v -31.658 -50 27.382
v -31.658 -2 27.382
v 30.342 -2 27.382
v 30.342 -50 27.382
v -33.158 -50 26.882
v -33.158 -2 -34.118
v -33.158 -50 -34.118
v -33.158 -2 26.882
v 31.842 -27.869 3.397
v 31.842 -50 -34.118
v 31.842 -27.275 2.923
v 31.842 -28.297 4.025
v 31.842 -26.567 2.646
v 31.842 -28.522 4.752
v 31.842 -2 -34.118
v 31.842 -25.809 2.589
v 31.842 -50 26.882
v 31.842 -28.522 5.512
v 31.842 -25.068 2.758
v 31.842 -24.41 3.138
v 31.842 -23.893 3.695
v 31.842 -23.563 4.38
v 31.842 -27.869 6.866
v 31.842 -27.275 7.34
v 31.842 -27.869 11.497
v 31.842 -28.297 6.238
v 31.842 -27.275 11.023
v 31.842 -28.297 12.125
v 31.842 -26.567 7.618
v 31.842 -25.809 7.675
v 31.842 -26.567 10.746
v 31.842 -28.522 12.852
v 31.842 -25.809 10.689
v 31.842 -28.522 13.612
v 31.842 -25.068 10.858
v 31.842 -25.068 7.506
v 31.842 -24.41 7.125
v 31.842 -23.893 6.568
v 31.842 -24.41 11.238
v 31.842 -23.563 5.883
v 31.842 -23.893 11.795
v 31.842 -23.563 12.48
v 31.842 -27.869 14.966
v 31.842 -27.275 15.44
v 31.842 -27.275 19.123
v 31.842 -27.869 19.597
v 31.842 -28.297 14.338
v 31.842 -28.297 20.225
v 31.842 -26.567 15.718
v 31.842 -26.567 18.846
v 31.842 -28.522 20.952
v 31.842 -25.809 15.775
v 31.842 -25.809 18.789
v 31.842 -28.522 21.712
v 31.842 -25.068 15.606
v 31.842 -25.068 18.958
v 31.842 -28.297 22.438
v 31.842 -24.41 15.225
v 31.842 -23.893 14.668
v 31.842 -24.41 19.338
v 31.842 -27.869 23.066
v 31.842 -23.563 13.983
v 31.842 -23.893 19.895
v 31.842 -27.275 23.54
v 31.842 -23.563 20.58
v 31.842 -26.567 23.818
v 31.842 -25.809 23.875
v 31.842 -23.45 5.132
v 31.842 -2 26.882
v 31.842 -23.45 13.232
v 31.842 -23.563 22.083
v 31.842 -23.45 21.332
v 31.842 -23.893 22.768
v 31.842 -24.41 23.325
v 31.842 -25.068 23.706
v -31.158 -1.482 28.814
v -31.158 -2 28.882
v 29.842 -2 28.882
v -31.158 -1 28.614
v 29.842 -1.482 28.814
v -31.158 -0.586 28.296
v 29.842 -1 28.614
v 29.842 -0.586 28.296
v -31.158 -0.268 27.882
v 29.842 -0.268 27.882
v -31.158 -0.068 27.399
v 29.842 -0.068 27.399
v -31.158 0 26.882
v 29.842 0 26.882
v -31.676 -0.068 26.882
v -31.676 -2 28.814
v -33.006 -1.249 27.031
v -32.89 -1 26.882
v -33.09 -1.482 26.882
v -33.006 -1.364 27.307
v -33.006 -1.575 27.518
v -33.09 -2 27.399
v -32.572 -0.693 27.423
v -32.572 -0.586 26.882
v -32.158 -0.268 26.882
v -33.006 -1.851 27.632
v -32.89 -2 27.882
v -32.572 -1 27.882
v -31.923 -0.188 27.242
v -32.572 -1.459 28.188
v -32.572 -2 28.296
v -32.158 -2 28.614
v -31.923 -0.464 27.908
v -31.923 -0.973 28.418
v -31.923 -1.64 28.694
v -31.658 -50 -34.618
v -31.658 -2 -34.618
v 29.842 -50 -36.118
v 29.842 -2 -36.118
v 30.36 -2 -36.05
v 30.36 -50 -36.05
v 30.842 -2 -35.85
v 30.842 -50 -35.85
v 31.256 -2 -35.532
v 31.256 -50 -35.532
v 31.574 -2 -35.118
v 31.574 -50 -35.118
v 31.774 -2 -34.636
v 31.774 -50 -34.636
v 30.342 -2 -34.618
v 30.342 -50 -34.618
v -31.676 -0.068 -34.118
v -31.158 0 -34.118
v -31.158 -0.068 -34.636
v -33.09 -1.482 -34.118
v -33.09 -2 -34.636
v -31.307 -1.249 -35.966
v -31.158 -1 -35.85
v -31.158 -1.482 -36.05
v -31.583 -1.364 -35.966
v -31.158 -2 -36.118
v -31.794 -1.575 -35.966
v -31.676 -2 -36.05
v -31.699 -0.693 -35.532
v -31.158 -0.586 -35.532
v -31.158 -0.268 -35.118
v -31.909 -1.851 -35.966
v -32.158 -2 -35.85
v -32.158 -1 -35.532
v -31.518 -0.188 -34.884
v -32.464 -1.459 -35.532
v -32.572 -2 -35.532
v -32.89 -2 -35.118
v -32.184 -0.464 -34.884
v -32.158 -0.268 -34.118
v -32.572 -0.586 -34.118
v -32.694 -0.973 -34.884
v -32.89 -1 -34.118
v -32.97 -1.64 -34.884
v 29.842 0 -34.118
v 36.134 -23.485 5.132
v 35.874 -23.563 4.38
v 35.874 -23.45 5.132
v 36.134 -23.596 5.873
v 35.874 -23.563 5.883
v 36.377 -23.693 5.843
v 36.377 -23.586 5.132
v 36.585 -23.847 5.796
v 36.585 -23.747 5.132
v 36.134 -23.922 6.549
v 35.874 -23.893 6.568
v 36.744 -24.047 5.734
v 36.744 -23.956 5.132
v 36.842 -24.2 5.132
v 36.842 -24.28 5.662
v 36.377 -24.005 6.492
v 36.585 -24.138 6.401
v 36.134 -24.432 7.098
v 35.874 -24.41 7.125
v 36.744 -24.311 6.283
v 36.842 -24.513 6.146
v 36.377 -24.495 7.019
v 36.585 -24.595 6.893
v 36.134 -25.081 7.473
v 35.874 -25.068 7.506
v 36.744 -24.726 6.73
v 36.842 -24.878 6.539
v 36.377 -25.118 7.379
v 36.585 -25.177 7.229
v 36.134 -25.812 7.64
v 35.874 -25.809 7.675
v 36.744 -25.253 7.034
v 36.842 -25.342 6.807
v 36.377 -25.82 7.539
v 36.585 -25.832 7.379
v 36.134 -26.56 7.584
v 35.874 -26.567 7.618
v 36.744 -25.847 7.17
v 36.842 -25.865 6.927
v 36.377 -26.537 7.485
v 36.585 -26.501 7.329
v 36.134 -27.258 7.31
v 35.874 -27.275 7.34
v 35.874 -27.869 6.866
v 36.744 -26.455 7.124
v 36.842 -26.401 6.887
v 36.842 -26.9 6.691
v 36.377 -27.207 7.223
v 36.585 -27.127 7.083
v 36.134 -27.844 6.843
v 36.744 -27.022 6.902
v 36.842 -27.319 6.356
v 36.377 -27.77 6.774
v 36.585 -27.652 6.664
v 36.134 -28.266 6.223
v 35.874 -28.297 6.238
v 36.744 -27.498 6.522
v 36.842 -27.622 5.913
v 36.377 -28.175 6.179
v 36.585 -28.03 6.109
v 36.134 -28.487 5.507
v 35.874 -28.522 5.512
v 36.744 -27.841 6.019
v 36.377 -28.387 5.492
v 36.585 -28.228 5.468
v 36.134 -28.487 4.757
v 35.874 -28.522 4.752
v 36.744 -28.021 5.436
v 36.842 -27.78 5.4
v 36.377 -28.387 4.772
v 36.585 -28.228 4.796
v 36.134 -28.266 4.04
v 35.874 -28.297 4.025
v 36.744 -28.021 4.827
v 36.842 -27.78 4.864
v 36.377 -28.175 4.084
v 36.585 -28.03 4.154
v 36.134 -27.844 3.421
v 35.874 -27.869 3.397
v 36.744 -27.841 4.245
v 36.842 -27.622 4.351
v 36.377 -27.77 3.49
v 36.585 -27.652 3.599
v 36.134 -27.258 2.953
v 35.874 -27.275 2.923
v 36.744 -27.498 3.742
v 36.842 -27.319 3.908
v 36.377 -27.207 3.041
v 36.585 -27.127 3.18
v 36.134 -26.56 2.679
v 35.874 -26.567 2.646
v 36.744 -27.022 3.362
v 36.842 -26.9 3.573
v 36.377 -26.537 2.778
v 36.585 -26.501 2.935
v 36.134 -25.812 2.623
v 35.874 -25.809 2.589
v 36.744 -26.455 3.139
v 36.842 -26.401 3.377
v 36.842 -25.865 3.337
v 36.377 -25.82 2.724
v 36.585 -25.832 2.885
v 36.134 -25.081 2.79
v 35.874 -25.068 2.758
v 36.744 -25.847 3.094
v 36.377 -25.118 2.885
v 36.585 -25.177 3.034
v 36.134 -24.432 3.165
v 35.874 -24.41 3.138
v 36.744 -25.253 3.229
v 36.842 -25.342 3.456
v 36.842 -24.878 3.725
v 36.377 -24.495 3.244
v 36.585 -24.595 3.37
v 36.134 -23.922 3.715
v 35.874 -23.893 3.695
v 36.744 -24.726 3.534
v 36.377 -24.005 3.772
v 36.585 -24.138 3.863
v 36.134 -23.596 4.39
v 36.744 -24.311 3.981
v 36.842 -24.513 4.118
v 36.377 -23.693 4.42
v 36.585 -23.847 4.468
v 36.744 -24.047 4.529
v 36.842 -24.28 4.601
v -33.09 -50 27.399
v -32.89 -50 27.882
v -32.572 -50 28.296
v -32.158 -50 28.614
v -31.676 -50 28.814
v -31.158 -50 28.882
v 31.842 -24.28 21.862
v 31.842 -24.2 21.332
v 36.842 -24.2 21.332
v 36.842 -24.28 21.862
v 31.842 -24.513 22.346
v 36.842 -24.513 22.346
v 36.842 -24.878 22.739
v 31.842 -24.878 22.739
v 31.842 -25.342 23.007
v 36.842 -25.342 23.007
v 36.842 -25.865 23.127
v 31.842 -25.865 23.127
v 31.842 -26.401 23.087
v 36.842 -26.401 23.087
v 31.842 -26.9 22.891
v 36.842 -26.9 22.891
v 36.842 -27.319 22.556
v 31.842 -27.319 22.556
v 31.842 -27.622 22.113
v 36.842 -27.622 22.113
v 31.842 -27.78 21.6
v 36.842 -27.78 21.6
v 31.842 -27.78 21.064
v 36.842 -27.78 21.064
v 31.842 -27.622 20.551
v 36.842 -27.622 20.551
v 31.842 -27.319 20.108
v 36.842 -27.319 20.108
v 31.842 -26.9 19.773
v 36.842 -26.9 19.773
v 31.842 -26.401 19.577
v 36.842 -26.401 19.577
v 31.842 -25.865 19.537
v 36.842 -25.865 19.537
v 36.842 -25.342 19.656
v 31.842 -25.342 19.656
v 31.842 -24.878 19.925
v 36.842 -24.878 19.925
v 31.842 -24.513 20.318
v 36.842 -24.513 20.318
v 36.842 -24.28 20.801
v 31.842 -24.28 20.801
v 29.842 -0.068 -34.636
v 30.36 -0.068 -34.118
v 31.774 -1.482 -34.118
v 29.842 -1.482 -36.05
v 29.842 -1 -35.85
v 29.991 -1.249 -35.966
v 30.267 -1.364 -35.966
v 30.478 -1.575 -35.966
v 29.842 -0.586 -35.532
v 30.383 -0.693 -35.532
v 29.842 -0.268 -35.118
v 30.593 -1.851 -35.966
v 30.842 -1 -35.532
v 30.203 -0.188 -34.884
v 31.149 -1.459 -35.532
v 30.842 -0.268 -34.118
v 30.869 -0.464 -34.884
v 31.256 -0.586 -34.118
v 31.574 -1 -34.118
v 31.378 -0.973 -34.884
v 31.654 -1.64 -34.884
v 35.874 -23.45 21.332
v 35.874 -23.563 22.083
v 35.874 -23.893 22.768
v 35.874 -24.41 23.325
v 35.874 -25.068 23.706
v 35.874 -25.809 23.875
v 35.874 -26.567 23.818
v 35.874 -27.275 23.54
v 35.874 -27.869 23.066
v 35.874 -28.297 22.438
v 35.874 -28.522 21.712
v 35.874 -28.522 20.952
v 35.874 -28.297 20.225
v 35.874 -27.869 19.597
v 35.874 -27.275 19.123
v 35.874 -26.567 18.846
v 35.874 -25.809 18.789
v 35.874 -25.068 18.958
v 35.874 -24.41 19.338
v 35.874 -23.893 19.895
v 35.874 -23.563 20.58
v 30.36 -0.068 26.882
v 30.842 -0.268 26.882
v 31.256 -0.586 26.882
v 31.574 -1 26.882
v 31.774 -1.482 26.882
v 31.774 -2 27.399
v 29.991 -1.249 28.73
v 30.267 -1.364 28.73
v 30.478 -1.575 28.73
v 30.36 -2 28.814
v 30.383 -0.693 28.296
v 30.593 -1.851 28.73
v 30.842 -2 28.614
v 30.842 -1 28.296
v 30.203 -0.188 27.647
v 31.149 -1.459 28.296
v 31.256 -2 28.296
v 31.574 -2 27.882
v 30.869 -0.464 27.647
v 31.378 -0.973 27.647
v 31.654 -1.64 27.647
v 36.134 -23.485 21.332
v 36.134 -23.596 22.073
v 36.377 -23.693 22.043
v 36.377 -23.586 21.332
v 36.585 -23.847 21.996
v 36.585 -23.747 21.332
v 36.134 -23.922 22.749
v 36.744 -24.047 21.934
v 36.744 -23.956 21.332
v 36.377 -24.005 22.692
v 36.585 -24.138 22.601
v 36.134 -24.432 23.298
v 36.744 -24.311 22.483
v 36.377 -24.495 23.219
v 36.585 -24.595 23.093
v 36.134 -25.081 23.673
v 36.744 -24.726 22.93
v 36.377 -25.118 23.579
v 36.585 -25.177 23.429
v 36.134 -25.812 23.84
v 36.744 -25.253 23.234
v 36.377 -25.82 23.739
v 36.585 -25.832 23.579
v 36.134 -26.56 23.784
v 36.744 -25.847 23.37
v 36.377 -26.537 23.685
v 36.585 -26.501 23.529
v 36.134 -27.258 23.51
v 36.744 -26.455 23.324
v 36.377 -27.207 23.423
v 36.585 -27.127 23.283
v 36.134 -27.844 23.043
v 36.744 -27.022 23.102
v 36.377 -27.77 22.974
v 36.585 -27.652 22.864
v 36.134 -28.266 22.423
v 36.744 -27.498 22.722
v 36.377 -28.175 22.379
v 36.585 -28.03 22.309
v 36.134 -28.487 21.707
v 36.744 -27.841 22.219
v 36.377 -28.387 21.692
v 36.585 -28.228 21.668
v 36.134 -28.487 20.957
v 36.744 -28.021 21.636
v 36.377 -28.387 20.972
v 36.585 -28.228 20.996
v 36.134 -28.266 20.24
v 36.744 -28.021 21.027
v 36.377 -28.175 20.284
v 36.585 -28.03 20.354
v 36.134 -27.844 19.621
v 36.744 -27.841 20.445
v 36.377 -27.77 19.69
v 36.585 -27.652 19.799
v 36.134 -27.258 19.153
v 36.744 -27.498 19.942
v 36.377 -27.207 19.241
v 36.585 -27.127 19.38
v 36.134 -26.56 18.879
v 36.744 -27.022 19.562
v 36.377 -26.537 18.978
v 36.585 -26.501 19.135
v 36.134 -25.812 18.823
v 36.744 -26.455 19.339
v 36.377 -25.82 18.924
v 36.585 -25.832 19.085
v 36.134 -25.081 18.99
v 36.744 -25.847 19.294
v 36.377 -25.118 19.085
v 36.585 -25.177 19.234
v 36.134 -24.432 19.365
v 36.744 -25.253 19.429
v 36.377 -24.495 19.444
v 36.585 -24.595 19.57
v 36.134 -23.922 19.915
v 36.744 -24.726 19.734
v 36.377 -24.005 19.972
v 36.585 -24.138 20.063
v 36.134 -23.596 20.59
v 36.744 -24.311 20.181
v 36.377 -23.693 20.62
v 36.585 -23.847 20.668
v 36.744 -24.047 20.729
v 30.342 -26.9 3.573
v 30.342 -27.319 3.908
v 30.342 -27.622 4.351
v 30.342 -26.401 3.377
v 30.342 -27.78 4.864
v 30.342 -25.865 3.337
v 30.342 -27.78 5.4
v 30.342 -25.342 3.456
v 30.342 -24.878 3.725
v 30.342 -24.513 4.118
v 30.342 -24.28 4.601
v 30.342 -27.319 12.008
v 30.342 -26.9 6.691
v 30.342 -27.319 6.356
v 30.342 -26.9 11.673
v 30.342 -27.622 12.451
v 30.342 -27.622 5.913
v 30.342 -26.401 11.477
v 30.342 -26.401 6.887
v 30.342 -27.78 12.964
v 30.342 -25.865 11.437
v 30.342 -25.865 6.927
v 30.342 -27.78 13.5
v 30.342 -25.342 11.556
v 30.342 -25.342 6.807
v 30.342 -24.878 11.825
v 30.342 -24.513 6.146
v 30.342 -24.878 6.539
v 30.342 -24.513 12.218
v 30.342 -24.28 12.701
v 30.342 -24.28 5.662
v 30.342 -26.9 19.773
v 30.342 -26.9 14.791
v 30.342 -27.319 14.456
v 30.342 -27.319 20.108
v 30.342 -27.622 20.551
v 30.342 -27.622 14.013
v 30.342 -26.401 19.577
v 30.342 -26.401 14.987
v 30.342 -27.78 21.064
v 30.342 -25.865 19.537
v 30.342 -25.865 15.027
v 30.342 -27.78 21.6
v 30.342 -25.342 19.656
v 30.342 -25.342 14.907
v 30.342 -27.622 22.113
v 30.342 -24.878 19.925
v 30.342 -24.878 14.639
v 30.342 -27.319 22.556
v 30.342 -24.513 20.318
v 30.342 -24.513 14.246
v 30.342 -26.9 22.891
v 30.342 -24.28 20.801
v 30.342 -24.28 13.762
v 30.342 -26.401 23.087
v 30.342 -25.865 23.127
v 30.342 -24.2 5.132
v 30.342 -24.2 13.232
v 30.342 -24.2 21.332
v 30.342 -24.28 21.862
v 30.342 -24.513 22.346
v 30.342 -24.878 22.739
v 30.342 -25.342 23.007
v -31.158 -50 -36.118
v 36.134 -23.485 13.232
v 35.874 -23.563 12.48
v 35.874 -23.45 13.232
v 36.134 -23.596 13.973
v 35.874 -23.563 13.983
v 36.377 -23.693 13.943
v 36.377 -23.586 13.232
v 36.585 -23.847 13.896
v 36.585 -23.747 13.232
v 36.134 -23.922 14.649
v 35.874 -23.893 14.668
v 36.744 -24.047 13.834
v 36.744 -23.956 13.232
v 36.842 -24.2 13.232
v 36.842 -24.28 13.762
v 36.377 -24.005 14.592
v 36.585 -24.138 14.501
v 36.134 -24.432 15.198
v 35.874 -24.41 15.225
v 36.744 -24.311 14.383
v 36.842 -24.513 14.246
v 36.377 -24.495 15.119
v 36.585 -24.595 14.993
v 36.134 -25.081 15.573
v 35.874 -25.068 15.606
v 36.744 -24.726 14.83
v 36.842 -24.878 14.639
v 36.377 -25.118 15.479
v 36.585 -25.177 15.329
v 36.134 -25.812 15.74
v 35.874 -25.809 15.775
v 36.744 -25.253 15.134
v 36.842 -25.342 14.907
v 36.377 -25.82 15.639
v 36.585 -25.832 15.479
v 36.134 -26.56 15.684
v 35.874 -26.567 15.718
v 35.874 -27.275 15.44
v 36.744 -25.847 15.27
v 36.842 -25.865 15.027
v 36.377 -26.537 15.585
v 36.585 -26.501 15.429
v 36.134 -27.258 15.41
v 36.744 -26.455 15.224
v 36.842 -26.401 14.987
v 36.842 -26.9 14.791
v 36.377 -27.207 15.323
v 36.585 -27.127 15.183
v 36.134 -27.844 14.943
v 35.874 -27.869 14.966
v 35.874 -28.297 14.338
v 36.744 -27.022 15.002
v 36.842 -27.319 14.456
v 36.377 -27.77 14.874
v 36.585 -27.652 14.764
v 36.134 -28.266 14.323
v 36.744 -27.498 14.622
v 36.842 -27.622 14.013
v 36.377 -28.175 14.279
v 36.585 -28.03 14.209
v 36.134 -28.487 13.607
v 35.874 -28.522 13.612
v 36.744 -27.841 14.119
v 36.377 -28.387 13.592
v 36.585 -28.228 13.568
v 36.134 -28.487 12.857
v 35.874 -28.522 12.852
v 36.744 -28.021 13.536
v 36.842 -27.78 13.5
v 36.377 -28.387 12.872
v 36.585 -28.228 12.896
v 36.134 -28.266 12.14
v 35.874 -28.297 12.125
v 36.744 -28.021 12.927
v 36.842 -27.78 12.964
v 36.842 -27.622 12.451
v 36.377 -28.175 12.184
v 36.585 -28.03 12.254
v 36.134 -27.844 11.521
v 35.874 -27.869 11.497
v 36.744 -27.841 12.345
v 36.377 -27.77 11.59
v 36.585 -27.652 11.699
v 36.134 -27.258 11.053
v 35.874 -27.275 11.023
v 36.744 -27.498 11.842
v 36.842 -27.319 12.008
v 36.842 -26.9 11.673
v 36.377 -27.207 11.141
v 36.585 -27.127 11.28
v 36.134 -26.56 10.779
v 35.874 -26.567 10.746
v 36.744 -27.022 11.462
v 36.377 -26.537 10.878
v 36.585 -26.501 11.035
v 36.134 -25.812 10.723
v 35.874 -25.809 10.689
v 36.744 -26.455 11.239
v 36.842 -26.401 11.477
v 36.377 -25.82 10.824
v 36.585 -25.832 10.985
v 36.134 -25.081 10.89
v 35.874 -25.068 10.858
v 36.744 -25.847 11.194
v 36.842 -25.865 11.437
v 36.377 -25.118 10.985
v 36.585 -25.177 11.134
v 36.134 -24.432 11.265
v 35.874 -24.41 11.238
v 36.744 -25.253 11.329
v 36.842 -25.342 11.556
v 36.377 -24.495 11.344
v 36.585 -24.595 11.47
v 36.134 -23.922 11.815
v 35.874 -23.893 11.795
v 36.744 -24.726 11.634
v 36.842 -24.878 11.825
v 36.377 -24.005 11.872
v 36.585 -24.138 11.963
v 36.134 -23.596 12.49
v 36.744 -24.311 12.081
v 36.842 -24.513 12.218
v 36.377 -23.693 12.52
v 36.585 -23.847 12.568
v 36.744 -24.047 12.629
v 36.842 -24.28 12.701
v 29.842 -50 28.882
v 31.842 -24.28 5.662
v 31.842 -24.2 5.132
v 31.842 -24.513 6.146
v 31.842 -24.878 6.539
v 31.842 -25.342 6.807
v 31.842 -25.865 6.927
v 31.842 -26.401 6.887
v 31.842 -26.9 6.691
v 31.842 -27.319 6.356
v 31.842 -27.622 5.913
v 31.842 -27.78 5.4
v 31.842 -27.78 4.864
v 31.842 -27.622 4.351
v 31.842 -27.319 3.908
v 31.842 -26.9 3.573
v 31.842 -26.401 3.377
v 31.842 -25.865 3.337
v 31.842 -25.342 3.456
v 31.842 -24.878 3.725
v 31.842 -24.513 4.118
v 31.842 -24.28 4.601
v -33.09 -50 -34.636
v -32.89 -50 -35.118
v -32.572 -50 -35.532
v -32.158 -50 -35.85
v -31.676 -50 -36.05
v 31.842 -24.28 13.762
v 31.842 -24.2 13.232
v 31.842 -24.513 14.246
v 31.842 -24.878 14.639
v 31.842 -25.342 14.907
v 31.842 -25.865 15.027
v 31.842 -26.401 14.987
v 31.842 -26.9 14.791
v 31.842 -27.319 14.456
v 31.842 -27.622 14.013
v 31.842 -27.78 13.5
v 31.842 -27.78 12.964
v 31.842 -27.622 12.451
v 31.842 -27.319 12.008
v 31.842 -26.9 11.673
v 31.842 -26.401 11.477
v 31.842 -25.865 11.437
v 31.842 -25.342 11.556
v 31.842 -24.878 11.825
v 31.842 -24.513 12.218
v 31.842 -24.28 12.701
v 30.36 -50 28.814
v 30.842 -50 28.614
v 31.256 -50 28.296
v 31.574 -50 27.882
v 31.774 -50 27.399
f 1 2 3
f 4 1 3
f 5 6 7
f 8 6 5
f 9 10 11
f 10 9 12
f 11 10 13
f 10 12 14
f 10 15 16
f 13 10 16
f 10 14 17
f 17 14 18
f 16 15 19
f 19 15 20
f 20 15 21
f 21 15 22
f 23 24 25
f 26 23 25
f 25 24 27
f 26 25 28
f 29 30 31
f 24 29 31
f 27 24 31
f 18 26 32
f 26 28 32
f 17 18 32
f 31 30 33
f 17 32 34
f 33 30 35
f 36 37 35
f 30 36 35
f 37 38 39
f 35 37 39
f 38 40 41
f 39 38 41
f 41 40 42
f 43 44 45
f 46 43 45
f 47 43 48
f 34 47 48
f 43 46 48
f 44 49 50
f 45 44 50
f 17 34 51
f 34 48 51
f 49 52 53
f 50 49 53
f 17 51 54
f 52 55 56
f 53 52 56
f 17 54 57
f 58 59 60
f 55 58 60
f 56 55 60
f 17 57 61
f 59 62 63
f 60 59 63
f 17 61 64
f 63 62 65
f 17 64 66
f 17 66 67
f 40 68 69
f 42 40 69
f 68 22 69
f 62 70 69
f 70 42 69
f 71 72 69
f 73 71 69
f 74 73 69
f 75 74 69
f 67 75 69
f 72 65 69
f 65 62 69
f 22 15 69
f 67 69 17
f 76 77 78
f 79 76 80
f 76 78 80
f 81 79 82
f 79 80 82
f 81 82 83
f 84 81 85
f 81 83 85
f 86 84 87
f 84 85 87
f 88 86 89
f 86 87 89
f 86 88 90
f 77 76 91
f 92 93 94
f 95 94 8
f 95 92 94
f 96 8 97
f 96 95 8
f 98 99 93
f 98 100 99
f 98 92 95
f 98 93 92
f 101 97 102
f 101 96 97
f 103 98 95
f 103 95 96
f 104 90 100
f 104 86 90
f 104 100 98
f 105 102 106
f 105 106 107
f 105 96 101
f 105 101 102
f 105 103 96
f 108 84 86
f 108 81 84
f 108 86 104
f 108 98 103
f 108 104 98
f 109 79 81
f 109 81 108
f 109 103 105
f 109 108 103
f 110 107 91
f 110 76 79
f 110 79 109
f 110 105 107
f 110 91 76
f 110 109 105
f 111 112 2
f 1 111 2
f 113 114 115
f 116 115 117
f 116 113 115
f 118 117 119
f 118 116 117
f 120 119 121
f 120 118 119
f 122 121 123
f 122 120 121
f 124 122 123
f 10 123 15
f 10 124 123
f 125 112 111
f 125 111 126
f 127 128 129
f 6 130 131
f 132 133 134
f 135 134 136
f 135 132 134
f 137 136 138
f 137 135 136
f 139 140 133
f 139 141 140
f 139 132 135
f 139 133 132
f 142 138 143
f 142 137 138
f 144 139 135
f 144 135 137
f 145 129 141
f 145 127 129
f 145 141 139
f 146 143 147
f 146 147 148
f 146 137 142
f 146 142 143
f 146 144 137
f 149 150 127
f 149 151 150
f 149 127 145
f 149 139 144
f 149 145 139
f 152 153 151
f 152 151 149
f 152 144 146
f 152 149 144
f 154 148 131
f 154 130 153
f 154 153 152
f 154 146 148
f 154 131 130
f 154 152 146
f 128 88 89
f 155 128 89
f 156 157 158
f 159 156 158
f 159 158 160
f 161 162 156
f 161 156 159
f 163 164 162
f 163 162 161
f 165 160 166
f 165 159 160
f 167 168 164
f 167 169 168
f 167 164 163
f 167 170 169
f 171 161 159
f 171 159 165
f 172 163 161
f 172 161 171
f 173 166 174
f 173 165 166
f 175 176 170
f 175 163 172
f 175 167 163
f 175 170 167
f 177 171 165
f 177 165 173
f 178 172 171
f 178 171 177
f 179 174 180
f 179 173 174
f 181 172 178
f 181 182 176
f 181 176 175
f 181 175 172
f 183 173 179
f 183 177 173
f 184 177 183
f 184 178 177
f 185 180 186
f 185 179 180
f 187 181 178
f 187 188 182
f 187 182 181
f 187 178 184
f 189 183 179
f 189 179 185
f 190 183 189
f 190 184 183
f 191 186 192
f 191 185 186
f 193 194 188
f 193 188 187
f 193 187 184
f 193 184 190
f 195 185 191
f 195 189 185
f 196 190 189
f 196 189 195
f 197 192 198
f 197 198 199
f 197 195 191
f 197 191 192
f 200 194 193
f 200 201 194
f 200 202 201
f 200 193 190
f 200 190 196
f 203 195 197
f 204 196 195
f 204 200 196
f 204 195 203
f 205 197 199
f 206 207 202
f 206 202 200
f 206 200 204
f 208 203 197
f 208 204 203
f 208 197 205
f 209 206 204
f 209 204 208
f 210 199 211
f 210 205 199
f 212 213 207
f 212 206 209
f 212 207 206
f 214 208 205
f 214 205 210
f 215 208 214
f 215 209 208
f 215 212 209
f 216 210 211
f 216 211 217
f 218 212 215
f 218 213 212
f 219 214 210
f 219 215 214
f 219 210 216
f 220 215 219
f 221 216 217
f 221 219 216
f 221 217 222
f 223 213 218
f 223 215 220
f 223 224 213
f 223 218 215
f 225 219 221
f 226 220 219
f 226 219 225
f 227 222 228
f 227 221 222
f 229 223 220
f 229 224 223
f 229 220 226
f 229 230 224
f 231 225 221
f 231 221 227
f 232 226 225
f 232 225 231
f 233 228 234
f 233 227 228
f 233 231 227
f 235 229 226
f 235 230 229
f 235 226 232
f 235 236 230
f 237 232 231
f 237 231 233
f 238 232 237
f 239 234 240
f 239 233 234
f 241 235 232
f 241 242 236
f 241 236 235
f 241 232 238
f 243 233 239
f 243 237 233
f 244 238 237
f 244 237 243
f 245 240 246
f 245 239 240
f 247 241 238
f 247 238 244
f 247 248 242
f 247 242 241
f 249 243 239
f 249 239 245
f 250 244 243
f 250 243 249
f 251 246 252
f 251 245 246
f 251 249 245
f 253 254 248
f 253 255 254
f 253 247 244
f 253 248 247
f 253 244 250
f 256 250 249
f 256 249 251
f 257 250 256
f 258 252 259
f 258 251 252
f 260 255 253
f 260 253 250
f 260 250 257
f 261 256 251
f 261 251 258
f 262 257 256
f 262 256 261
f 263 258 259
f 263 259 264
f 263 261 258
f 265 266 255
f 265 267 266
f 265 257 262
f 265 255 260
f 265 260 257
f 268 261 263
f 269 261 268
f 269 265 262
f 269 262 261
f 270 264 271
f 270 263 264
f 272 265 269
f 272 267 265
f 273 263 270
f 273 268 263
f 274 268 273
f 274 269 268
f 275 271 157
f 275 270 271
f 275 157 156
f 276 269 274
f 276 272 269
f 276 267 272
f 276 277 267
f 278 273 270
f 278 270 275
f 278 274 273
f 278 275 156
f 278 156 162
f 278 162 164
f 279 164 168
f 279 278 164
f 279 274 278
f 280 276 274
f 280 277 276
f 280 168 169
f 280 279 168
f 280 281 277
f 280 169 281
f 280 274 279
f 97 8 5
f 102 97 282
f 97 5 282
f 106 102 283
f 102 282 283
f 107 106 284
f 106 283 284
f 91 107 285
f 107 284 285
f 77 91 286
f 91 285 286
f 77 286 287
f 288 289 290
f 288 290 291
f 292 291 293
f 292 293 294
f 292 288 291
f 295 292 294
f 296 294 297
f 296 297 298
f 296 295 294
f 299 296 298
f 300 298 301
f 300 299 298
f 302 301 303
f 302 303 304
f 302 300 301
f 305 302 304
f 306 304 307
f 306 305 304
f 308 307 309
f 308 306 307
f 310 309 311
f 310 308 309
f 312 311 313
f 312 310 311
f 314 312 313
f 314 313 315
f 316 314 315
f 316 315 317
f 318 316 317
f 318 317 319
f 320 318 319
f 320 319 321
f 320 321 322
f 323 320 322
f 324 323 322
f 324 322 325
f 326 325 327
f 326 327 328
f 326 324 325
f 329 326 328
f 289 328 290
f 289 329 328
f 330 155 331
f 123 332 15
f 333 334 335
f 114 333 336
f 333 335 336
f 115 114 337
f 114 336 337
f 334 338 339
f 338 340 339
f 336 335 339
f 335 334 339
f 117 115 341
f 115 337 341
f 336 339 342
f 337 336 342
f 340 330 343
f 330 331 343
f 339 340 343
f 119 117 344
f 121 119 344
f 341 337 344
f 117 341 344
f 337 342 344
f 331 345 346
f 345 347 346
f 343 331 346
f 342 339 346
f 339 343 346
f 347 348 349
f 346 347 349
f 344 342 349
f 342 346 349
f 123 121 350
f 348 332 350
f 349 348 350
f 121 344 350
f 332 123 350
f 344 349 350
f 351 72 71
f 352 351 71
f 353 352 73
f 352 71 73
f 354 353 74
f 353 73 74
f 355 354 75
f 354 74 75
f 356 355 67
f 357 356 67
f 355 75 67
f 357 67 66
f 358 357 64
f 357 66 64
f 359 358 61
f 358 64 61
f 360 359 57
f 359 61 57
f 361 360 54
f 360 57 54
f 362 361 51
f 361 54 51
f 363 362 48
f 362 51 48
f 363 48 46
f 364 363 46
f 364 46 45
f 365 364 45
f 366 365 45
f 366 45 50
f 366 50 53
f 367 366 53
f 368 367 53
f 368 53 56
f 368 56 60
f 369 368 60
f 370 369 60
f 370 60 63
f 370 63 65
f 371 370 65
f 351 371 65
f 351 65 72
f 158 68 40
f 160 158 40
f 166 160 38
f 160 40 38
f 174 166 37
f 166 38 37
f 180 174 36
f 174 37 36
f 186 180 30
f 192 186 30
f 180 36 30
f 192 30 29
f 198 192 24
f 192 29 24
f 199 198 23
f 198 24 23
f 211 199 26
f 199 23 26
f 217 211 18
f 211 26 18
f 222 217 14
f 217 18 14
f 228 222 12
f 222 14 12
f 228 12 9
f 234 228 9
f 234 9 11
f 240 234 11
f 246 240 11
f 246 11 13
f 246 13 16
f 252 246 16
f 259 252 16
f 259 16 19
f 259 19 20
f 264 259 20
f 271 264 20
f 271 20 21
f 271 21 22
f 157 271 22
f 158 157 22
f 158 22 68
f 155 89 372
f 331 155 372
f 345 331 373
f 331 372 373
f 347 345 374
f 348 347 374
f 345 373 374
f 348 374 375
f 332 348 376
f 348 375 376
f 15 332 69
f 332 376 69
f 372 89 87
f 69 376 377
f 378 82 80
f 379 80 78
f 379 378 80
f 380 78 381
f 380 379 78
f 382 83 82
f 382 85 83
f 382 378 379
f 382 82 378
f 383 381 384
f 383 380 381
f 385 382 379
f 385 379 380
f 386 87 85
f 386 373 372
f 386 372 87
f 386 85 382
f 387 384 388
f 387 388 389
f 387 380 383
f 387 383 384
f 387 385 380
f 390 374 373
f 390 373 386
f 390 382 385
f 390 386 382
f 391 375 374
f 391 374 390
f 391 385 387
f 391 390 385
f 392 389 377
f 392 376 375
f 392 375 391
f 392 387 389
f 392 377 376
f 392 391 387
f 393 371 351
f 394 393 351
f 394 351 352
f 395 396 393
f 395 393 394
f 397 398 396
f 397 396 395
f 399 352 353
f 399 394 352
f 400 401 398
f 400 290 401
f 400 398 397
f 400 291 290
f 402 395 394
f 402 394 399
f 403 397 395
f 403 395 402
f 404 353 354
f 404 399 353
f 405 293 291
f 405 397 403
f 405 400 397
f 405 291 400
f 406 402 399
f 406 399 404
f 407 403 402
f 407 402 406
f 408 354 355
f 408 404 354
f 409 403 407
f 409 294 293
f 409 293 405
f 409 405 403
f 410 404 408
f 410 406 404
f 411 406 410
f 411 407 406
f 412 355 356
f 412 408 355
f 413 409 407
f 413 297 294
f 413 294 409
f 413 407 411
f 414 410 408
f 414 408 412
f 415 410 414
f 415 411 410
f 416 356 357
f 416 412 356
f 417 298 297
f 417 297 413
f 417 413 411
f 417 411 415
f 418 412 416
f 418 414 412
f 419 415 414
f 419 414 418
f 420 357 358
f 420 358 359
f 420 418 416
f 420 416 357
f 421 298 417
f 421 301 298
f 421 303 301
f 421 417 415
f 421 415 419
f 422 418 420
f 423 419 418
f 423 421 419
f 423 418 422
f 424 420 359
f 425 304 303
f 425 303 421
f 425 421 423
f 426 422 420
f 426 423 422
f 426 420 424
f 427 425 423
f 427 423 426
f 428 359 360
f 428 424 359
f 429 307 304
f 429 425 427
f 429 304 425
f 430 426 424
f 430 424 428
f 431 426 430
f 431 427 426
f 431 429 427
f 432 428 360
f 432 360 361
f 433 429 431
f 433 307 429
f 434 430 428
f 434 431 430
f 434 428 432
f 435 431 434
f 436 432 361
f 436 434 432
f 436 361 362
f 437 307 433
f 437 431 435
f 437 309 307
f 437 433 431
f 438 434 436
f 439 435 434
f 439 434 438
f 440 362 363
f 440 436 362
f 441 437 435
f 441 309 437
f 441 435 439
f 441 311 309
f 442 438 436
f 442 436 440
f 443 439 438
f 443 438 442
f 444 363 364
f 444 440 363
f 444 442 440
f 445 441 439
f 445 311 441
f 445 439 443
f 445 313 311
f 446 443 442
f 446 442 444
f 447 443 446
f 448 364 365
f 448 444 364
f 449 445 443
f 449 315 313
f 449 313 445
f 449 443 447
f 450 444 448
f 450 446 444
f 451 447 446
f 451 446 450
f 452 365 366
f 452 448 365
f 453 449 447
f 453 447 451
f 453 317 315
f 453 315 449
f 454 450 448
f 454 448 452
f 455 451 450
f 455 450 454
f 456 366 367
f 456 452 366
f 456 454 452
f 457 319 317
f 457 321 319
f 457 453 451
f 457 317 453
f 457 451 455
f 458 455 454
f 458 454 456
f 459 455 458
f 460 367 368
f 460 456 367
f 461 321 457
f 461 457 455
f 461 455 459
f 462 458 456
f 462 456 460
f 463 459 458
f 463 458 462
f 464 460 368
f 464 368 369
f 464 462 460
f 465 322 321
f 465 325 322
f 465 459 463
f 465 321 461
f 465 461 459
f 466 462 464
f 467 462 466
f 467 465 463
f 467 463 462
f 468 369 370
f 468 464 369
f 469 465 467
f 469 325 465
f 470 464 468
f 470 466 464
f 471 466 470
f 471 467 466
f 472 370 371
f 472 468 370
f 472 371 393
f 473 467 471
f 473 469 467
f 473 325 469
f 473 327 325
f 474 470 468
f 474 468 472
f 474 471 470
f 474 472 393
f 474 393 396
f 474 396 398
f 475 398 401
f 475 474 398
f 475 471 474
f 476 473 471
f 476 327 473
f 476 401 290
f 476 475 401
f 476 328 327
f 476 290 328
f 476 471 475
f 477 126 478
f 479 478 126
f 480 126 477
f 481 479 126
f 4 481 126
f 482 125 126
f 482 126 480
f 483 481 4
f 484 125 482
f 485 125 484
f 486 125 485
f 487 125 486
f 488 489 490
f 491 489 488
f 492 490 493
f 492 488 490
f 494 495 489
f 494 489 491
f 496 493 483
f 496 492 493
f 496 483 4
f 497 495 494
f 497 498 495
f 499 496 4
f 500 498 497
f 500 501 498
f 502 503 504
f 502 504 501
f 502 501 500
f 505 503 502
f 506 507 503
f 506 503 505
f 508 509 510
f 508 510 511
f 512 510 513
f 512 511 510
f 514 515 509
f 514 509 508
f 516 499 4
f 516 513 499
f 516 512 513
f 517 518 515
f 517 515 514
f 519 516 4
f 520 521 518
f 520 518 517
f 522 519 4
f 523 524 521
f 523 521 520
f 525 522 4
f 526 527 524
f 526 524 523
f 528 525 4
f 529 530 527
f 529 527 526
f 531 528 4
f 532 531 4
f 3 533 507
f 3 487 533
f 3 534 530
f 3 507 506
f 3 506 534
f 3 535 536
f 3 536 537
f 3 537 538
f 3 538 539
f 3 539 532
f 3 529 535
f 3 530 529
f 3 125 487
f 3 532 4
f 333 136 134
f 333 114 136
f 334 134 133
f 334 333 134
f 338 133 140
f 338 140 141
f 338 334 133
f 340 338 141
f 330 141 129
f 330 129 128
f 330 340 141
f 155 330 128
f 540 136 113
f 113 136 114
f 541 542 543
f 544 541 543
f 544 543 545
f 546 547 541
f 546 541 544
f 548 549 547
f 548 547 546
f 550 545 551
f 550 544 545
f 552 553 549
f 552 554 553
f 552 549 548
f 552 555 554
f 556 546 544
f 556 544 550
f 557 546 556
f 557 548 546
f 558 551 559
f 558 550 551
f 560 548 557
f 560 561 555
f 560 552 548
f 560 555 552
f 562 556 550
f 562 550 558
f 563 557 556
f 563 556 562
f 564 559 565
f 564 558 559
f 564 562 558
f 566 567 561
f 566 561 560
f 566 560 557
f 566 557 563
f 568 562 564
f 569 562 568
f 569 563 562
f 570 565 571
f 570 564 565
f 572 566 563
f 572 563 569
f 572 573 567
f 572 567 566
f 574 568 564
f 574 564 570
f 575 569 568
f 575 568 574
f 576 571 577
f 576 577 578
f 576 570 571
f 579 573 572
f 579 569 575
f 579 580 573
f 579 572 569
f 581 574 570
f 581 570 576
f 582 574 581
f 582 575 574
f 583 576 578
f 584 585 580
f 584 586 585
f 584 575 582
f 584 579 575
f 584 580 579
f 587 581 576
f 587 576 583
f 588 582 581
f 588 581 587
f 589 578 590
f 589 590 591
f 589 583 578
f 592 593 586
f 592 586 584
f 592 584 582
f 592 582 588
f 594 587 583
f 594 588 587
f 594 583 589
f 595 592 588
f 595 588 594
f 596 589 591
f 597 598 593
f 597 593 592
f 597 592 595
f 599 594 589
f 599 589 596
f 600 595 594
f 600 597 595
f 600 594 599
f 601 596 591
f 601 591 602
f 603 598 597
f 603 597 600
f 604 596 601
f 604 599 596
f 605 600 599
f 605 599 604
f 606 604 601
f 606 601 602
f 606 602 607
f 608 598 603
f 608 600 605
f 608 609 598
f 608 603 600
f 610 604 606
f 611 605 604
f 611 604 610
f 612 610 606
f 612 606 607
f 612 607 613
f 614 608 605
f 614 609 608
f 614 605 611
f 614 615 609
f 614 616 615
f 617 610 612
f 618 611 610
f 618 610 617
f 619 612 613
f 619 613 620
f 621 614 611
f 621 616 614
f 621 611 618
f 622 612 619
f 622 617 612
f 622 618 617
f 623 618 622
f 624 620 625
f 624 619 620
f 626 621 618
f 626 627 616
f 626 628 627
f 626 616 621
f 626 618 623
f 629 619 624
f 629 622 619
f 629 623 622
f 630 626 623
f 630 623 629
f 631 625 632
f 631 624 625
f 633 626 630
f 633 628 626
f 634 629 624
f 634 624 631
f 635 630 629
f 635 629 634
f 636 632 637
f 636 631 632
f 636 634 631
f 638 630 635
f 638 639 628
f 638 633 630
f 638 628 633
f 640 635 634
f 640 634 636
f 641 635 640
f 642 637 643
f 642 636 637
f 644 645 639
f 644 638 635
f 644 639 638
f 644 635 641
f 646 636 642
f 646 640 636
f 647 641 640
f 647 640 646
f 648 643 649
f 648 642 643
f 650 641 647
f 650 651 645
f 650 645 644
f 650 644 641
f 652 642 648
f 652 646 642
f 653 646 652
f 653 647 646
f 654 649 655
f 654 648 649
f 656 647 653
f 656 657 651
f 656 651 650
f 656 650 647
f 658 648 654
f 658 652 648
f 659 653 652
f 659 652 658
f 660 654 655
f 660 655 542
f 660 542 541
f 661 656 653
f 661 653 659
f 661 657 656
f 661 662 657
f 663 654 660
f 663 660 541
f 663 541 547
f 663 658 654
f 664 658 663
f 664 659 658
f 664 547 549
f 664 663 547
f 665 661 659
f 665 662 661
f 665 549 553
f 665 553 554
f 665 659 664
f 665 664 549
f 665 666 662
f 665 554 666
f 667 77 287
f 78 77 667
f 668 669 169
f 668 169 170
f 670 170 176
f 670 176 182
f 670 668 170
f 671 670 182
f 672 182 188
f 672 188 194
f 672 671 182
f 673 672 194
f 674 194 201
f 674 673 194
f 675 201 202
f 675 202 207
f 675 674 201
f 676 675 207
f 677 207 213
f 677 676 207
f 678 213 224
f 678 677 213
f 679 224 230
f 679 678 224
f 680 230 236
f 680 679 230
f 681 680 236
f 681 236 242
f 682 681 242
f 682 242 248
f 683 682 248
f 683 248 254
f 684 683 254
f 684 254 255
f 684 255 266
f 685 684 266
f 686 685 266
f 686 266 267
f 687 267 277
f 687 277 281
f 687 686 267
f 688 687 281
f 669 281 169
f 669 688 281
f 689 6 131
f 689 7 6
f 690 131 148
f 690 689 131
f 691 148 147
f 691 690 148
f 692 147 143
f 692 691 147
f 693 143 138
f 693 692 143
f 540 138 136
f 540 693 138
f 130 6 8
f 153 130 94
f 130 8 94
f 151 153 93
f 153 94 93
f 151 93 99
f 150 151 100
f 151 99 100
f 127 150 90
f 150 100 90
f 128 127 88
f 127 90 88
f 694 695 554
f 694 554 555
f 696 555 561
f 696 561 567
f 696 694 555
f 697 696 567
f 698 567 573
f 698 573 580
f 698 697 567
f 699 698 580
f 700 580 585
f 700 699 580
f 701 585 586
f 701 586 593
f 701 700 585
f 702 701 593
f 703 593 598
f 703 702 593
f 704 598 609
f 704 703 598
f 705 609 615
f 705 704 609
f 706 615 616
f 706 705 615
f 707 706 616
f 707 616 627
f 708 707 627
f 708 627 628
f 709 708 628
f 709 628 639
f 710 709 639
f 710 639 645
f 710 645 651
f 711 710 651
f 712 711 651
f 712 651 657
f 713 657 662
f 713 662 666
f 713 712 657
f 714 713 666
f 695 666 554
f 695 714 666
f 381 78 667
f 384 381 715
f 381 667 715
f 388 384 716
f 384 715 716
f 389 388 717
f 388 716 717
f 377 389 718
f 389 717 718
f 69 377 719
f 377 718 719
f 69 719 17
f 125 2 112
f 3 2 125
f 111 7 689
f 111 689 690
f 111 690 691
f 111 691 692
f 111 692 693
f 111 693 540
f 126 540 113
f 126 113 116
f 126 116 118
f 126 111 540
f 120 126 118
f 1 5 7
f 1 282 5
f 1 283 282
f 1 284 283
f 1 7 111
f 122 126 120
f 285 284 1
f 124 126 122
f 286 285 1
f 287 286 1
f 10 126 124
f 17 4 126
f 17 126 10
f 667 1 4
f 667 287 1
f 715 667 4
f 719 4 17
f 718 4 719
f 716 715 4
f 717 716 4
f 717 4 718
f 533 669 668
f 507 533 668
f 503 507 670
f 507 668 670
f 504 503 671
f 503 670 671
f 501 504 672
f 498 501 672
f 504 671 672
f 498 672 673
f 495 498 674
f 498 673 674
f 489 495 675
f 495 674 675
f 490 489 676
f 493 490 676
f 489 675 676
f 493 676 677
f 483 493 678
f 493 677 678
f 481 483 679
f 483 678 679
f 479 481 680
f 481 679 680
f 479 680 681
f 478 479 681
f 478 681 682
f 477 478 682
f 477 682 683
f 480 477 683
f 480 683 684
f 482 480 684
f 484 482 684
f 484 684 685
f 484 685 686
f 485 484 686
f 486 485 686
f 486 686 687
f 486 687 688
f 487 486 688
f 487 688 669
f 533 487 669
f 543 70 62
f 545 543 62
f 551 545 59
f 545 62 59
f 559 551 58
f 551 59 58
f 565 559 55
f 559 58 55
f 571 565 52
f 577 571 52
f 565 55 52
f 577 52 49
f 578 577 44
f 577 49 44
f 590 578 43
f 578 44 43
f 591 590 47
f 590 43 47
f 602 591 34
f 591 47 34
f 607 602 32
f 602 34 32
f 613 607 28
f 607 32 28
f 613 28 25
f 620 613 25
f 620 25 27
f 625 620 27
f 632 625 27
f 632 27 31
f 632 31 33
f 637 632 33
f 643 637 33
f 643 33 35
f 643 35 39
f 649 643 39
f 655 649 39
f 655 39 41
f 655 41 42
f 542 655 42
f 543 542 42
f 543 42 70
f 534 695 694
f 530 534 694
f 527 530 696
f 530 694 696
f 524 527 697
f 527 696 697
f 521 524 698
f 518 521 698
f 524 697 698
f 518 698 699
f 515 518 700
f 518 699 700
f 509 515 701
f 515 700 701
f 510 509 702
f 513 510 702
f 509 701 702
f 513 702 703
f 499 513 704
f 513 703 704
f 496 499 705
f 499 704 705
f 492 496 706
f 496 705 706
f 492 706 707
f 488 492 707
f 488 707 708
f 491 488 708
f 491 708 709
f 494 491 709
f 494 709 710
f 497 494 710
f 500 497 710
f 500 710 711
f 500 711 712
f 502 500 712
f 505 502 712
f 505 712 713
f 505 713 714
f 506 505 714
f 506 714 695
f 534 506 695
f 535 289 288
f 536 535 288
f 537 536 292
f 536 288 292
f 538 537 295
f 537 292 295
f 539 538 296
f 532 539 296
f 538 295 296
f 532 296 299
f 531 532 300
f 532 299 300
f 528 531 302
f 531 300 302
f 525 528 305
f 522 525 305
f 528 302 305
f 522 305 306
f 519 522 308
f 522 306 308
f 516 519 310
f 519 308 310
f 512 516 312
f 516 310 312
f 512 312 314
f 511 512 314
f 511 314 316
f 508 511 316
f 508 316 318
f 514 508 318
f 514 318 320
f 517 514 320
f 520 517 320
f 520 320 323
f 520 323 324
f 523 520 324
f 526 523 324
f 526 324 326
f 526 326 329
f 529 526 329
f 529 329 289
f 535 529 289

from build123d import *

# Parameters (mm, degrees)
F0_W     = 62
F0_H     = 62
F1_DEPTH = 2
F0_W_2   = 65
F0_H_2   = 65
F2_DEPTH = 50
F3_R     = 2
F4_R     = 1.8
F5_DEPTH = 25
F6_DEPTH = 25
F4_R_2   = 2.55
F7_DEPTH = 5


# Not quite as in the source:
# - a fillet or chamfer that OpenCascade refuses, or shapes differently, is made with other operations: its cross-section is extruded or revolved along the edge and cut away or added


with BuildPart() as f1:
    # F0 (on Front) → F1 (new body)
    with BuildSketch(Plane.XZ):
        with Locations((-0.6578962505, -3.6181825721)):
            Rectangle(F0_W, F0_H)
    extrude(amount=F1_DEPTH)

    # F0 (on Front) → F2 (join)
    with BuildSketch(Plane.XZ):
        with Locations((-0.6578962505, -3.6181825721)):
            Rectangle(F0_W_2, F0_H_2)
        with Locations((-0.6578962505, -3.6181825721)):
            Rectangle(F0_W, F0_H, mode=Mode.SUBTRACT)
    extrude(amount=F2_DEPTH)

    # F3
    f3_edges = [f1.edges().sort_by_distance(p)[0] for p in [
        (31.842104, 0, -3.618183),
        (-0.657896, 0, 28.881817),
        (-33.157896, 0, -3.618183),
        (-0.657896, 0, -36.118183),
        (31.842104, -25, 28.881817),
        (31.842104, -25, -36.118183),
        (-33.157896, -25, -36.118183),
        (-33.157896, -25, 28.881817),
    ]]
    fillet(f3_edges, radius=F3_R)

    # F4 (on face) → F5 (cut)
    with BuildSketch(Plane.YZ.offset(31.8421037495)):
        with Locations((-26, 21.3318174279)):
            Circle(F4_R)
    extrude(amount=-F5_DEPTH, mode=Mode.SUBTRACT)

    # F4 (on face) → F6 (cut)
    with BuildSketch(Plane.YZ.offset(31.8421037495)):
        with Locations((-26, 13.2318174279)):
            Circle(F4_R)
        with Locations((-26, 5.1318174279)):
            Circle(F4_R)
    extrude(amount=-F6_DEPTH, mode=Mode.SUBTRACT)

    # F4 (on face) → F7 (join)
    with BuildSketch(Plane.YZ.offset(31.8421037495)):
        with Locations((-26, 21.3318174279)):
            Circle(F4_R_2)
        with Locations((-26, 21.3318174279)):
            Circle(F4_R, mode=Mode.SUBTRACT)
        with Locations((-26, 13.2318174279)):
            Circle(F4_R_2)
        with Locations((-26, 13.2318174279)):
            Circle(F4_R, mode=Mode.SUBTRACT)
        with Locations((-26, 5.1318174279)):
            Circle(F4_R_2)
        with Locations((-26, 5.1318174279)):
            Circle(F4_R, mode=Mode.SUBTRACT)
    extrude(amount=F7_DEPTH)

    # F8: fillet of radius 1 on 3 edges, made by hand

    # F8_s1 → F8_t2 (revolve, cut)
    with BuildSketch(Plane.XY.offset(21.3318174279)):
        with BuildLine():
            ThreePointArc((35.873857913, -23.45), (36.4862303487, -23.659430585), (36.8421037495, -24.2))
            Line((36.8421037495, -24.2), (36.8421037495, -23.45))
            Line((36.8421037495, -23.45), (35.873857913, -23.45))
        make_face()
    revolve(axis=Axis((36.8421037495, -26, 21.3318174279), (1, 0, 0)), mode=Mode.SUBTRACT)

    # F8_s3 → F8_t4 (revolve, cut)
    with BuildSketch(Plane.XY.offset(13.2318174279)):
        with BuildLine():
            ThreePointArc((35.873857913, -23.45), (36.4862303487, -23.659430585), (36.8421037495, -24.2))
            Line((36.8421037495, -24.2), (36.8421037495, -23.45))
            Line((36.8421037495, -23.45), (35.873857913, -23.45))
        make_face()
    revolve(axis=Axis((36.8421037495, -26, 13.2318174279), (1, 0, 0)), mode=Mode.SUBTRACT)

    # F8_s5 → F8_t6 (revolve, cut)
    with BuildSketch(Plane.XY.offset(5.1318174279)):
        with BuildLine():
            ThreePointArc((35.873857913, -23.45), (36.4862303487, -23.659430585), (36.8421037495, -24.2))
            Line((36.8421037495, -24.2), (36.8421037495, -23.45))
            Line((36.8421037495, -23.45), (35.873857913, -23.45))
        make_face()
    revolve(axis=Axis((36.8421037495, -26, 5.1318174279), (1, 0, 0)), mode=Mode.SUBTRACT)


solid = f1.part
